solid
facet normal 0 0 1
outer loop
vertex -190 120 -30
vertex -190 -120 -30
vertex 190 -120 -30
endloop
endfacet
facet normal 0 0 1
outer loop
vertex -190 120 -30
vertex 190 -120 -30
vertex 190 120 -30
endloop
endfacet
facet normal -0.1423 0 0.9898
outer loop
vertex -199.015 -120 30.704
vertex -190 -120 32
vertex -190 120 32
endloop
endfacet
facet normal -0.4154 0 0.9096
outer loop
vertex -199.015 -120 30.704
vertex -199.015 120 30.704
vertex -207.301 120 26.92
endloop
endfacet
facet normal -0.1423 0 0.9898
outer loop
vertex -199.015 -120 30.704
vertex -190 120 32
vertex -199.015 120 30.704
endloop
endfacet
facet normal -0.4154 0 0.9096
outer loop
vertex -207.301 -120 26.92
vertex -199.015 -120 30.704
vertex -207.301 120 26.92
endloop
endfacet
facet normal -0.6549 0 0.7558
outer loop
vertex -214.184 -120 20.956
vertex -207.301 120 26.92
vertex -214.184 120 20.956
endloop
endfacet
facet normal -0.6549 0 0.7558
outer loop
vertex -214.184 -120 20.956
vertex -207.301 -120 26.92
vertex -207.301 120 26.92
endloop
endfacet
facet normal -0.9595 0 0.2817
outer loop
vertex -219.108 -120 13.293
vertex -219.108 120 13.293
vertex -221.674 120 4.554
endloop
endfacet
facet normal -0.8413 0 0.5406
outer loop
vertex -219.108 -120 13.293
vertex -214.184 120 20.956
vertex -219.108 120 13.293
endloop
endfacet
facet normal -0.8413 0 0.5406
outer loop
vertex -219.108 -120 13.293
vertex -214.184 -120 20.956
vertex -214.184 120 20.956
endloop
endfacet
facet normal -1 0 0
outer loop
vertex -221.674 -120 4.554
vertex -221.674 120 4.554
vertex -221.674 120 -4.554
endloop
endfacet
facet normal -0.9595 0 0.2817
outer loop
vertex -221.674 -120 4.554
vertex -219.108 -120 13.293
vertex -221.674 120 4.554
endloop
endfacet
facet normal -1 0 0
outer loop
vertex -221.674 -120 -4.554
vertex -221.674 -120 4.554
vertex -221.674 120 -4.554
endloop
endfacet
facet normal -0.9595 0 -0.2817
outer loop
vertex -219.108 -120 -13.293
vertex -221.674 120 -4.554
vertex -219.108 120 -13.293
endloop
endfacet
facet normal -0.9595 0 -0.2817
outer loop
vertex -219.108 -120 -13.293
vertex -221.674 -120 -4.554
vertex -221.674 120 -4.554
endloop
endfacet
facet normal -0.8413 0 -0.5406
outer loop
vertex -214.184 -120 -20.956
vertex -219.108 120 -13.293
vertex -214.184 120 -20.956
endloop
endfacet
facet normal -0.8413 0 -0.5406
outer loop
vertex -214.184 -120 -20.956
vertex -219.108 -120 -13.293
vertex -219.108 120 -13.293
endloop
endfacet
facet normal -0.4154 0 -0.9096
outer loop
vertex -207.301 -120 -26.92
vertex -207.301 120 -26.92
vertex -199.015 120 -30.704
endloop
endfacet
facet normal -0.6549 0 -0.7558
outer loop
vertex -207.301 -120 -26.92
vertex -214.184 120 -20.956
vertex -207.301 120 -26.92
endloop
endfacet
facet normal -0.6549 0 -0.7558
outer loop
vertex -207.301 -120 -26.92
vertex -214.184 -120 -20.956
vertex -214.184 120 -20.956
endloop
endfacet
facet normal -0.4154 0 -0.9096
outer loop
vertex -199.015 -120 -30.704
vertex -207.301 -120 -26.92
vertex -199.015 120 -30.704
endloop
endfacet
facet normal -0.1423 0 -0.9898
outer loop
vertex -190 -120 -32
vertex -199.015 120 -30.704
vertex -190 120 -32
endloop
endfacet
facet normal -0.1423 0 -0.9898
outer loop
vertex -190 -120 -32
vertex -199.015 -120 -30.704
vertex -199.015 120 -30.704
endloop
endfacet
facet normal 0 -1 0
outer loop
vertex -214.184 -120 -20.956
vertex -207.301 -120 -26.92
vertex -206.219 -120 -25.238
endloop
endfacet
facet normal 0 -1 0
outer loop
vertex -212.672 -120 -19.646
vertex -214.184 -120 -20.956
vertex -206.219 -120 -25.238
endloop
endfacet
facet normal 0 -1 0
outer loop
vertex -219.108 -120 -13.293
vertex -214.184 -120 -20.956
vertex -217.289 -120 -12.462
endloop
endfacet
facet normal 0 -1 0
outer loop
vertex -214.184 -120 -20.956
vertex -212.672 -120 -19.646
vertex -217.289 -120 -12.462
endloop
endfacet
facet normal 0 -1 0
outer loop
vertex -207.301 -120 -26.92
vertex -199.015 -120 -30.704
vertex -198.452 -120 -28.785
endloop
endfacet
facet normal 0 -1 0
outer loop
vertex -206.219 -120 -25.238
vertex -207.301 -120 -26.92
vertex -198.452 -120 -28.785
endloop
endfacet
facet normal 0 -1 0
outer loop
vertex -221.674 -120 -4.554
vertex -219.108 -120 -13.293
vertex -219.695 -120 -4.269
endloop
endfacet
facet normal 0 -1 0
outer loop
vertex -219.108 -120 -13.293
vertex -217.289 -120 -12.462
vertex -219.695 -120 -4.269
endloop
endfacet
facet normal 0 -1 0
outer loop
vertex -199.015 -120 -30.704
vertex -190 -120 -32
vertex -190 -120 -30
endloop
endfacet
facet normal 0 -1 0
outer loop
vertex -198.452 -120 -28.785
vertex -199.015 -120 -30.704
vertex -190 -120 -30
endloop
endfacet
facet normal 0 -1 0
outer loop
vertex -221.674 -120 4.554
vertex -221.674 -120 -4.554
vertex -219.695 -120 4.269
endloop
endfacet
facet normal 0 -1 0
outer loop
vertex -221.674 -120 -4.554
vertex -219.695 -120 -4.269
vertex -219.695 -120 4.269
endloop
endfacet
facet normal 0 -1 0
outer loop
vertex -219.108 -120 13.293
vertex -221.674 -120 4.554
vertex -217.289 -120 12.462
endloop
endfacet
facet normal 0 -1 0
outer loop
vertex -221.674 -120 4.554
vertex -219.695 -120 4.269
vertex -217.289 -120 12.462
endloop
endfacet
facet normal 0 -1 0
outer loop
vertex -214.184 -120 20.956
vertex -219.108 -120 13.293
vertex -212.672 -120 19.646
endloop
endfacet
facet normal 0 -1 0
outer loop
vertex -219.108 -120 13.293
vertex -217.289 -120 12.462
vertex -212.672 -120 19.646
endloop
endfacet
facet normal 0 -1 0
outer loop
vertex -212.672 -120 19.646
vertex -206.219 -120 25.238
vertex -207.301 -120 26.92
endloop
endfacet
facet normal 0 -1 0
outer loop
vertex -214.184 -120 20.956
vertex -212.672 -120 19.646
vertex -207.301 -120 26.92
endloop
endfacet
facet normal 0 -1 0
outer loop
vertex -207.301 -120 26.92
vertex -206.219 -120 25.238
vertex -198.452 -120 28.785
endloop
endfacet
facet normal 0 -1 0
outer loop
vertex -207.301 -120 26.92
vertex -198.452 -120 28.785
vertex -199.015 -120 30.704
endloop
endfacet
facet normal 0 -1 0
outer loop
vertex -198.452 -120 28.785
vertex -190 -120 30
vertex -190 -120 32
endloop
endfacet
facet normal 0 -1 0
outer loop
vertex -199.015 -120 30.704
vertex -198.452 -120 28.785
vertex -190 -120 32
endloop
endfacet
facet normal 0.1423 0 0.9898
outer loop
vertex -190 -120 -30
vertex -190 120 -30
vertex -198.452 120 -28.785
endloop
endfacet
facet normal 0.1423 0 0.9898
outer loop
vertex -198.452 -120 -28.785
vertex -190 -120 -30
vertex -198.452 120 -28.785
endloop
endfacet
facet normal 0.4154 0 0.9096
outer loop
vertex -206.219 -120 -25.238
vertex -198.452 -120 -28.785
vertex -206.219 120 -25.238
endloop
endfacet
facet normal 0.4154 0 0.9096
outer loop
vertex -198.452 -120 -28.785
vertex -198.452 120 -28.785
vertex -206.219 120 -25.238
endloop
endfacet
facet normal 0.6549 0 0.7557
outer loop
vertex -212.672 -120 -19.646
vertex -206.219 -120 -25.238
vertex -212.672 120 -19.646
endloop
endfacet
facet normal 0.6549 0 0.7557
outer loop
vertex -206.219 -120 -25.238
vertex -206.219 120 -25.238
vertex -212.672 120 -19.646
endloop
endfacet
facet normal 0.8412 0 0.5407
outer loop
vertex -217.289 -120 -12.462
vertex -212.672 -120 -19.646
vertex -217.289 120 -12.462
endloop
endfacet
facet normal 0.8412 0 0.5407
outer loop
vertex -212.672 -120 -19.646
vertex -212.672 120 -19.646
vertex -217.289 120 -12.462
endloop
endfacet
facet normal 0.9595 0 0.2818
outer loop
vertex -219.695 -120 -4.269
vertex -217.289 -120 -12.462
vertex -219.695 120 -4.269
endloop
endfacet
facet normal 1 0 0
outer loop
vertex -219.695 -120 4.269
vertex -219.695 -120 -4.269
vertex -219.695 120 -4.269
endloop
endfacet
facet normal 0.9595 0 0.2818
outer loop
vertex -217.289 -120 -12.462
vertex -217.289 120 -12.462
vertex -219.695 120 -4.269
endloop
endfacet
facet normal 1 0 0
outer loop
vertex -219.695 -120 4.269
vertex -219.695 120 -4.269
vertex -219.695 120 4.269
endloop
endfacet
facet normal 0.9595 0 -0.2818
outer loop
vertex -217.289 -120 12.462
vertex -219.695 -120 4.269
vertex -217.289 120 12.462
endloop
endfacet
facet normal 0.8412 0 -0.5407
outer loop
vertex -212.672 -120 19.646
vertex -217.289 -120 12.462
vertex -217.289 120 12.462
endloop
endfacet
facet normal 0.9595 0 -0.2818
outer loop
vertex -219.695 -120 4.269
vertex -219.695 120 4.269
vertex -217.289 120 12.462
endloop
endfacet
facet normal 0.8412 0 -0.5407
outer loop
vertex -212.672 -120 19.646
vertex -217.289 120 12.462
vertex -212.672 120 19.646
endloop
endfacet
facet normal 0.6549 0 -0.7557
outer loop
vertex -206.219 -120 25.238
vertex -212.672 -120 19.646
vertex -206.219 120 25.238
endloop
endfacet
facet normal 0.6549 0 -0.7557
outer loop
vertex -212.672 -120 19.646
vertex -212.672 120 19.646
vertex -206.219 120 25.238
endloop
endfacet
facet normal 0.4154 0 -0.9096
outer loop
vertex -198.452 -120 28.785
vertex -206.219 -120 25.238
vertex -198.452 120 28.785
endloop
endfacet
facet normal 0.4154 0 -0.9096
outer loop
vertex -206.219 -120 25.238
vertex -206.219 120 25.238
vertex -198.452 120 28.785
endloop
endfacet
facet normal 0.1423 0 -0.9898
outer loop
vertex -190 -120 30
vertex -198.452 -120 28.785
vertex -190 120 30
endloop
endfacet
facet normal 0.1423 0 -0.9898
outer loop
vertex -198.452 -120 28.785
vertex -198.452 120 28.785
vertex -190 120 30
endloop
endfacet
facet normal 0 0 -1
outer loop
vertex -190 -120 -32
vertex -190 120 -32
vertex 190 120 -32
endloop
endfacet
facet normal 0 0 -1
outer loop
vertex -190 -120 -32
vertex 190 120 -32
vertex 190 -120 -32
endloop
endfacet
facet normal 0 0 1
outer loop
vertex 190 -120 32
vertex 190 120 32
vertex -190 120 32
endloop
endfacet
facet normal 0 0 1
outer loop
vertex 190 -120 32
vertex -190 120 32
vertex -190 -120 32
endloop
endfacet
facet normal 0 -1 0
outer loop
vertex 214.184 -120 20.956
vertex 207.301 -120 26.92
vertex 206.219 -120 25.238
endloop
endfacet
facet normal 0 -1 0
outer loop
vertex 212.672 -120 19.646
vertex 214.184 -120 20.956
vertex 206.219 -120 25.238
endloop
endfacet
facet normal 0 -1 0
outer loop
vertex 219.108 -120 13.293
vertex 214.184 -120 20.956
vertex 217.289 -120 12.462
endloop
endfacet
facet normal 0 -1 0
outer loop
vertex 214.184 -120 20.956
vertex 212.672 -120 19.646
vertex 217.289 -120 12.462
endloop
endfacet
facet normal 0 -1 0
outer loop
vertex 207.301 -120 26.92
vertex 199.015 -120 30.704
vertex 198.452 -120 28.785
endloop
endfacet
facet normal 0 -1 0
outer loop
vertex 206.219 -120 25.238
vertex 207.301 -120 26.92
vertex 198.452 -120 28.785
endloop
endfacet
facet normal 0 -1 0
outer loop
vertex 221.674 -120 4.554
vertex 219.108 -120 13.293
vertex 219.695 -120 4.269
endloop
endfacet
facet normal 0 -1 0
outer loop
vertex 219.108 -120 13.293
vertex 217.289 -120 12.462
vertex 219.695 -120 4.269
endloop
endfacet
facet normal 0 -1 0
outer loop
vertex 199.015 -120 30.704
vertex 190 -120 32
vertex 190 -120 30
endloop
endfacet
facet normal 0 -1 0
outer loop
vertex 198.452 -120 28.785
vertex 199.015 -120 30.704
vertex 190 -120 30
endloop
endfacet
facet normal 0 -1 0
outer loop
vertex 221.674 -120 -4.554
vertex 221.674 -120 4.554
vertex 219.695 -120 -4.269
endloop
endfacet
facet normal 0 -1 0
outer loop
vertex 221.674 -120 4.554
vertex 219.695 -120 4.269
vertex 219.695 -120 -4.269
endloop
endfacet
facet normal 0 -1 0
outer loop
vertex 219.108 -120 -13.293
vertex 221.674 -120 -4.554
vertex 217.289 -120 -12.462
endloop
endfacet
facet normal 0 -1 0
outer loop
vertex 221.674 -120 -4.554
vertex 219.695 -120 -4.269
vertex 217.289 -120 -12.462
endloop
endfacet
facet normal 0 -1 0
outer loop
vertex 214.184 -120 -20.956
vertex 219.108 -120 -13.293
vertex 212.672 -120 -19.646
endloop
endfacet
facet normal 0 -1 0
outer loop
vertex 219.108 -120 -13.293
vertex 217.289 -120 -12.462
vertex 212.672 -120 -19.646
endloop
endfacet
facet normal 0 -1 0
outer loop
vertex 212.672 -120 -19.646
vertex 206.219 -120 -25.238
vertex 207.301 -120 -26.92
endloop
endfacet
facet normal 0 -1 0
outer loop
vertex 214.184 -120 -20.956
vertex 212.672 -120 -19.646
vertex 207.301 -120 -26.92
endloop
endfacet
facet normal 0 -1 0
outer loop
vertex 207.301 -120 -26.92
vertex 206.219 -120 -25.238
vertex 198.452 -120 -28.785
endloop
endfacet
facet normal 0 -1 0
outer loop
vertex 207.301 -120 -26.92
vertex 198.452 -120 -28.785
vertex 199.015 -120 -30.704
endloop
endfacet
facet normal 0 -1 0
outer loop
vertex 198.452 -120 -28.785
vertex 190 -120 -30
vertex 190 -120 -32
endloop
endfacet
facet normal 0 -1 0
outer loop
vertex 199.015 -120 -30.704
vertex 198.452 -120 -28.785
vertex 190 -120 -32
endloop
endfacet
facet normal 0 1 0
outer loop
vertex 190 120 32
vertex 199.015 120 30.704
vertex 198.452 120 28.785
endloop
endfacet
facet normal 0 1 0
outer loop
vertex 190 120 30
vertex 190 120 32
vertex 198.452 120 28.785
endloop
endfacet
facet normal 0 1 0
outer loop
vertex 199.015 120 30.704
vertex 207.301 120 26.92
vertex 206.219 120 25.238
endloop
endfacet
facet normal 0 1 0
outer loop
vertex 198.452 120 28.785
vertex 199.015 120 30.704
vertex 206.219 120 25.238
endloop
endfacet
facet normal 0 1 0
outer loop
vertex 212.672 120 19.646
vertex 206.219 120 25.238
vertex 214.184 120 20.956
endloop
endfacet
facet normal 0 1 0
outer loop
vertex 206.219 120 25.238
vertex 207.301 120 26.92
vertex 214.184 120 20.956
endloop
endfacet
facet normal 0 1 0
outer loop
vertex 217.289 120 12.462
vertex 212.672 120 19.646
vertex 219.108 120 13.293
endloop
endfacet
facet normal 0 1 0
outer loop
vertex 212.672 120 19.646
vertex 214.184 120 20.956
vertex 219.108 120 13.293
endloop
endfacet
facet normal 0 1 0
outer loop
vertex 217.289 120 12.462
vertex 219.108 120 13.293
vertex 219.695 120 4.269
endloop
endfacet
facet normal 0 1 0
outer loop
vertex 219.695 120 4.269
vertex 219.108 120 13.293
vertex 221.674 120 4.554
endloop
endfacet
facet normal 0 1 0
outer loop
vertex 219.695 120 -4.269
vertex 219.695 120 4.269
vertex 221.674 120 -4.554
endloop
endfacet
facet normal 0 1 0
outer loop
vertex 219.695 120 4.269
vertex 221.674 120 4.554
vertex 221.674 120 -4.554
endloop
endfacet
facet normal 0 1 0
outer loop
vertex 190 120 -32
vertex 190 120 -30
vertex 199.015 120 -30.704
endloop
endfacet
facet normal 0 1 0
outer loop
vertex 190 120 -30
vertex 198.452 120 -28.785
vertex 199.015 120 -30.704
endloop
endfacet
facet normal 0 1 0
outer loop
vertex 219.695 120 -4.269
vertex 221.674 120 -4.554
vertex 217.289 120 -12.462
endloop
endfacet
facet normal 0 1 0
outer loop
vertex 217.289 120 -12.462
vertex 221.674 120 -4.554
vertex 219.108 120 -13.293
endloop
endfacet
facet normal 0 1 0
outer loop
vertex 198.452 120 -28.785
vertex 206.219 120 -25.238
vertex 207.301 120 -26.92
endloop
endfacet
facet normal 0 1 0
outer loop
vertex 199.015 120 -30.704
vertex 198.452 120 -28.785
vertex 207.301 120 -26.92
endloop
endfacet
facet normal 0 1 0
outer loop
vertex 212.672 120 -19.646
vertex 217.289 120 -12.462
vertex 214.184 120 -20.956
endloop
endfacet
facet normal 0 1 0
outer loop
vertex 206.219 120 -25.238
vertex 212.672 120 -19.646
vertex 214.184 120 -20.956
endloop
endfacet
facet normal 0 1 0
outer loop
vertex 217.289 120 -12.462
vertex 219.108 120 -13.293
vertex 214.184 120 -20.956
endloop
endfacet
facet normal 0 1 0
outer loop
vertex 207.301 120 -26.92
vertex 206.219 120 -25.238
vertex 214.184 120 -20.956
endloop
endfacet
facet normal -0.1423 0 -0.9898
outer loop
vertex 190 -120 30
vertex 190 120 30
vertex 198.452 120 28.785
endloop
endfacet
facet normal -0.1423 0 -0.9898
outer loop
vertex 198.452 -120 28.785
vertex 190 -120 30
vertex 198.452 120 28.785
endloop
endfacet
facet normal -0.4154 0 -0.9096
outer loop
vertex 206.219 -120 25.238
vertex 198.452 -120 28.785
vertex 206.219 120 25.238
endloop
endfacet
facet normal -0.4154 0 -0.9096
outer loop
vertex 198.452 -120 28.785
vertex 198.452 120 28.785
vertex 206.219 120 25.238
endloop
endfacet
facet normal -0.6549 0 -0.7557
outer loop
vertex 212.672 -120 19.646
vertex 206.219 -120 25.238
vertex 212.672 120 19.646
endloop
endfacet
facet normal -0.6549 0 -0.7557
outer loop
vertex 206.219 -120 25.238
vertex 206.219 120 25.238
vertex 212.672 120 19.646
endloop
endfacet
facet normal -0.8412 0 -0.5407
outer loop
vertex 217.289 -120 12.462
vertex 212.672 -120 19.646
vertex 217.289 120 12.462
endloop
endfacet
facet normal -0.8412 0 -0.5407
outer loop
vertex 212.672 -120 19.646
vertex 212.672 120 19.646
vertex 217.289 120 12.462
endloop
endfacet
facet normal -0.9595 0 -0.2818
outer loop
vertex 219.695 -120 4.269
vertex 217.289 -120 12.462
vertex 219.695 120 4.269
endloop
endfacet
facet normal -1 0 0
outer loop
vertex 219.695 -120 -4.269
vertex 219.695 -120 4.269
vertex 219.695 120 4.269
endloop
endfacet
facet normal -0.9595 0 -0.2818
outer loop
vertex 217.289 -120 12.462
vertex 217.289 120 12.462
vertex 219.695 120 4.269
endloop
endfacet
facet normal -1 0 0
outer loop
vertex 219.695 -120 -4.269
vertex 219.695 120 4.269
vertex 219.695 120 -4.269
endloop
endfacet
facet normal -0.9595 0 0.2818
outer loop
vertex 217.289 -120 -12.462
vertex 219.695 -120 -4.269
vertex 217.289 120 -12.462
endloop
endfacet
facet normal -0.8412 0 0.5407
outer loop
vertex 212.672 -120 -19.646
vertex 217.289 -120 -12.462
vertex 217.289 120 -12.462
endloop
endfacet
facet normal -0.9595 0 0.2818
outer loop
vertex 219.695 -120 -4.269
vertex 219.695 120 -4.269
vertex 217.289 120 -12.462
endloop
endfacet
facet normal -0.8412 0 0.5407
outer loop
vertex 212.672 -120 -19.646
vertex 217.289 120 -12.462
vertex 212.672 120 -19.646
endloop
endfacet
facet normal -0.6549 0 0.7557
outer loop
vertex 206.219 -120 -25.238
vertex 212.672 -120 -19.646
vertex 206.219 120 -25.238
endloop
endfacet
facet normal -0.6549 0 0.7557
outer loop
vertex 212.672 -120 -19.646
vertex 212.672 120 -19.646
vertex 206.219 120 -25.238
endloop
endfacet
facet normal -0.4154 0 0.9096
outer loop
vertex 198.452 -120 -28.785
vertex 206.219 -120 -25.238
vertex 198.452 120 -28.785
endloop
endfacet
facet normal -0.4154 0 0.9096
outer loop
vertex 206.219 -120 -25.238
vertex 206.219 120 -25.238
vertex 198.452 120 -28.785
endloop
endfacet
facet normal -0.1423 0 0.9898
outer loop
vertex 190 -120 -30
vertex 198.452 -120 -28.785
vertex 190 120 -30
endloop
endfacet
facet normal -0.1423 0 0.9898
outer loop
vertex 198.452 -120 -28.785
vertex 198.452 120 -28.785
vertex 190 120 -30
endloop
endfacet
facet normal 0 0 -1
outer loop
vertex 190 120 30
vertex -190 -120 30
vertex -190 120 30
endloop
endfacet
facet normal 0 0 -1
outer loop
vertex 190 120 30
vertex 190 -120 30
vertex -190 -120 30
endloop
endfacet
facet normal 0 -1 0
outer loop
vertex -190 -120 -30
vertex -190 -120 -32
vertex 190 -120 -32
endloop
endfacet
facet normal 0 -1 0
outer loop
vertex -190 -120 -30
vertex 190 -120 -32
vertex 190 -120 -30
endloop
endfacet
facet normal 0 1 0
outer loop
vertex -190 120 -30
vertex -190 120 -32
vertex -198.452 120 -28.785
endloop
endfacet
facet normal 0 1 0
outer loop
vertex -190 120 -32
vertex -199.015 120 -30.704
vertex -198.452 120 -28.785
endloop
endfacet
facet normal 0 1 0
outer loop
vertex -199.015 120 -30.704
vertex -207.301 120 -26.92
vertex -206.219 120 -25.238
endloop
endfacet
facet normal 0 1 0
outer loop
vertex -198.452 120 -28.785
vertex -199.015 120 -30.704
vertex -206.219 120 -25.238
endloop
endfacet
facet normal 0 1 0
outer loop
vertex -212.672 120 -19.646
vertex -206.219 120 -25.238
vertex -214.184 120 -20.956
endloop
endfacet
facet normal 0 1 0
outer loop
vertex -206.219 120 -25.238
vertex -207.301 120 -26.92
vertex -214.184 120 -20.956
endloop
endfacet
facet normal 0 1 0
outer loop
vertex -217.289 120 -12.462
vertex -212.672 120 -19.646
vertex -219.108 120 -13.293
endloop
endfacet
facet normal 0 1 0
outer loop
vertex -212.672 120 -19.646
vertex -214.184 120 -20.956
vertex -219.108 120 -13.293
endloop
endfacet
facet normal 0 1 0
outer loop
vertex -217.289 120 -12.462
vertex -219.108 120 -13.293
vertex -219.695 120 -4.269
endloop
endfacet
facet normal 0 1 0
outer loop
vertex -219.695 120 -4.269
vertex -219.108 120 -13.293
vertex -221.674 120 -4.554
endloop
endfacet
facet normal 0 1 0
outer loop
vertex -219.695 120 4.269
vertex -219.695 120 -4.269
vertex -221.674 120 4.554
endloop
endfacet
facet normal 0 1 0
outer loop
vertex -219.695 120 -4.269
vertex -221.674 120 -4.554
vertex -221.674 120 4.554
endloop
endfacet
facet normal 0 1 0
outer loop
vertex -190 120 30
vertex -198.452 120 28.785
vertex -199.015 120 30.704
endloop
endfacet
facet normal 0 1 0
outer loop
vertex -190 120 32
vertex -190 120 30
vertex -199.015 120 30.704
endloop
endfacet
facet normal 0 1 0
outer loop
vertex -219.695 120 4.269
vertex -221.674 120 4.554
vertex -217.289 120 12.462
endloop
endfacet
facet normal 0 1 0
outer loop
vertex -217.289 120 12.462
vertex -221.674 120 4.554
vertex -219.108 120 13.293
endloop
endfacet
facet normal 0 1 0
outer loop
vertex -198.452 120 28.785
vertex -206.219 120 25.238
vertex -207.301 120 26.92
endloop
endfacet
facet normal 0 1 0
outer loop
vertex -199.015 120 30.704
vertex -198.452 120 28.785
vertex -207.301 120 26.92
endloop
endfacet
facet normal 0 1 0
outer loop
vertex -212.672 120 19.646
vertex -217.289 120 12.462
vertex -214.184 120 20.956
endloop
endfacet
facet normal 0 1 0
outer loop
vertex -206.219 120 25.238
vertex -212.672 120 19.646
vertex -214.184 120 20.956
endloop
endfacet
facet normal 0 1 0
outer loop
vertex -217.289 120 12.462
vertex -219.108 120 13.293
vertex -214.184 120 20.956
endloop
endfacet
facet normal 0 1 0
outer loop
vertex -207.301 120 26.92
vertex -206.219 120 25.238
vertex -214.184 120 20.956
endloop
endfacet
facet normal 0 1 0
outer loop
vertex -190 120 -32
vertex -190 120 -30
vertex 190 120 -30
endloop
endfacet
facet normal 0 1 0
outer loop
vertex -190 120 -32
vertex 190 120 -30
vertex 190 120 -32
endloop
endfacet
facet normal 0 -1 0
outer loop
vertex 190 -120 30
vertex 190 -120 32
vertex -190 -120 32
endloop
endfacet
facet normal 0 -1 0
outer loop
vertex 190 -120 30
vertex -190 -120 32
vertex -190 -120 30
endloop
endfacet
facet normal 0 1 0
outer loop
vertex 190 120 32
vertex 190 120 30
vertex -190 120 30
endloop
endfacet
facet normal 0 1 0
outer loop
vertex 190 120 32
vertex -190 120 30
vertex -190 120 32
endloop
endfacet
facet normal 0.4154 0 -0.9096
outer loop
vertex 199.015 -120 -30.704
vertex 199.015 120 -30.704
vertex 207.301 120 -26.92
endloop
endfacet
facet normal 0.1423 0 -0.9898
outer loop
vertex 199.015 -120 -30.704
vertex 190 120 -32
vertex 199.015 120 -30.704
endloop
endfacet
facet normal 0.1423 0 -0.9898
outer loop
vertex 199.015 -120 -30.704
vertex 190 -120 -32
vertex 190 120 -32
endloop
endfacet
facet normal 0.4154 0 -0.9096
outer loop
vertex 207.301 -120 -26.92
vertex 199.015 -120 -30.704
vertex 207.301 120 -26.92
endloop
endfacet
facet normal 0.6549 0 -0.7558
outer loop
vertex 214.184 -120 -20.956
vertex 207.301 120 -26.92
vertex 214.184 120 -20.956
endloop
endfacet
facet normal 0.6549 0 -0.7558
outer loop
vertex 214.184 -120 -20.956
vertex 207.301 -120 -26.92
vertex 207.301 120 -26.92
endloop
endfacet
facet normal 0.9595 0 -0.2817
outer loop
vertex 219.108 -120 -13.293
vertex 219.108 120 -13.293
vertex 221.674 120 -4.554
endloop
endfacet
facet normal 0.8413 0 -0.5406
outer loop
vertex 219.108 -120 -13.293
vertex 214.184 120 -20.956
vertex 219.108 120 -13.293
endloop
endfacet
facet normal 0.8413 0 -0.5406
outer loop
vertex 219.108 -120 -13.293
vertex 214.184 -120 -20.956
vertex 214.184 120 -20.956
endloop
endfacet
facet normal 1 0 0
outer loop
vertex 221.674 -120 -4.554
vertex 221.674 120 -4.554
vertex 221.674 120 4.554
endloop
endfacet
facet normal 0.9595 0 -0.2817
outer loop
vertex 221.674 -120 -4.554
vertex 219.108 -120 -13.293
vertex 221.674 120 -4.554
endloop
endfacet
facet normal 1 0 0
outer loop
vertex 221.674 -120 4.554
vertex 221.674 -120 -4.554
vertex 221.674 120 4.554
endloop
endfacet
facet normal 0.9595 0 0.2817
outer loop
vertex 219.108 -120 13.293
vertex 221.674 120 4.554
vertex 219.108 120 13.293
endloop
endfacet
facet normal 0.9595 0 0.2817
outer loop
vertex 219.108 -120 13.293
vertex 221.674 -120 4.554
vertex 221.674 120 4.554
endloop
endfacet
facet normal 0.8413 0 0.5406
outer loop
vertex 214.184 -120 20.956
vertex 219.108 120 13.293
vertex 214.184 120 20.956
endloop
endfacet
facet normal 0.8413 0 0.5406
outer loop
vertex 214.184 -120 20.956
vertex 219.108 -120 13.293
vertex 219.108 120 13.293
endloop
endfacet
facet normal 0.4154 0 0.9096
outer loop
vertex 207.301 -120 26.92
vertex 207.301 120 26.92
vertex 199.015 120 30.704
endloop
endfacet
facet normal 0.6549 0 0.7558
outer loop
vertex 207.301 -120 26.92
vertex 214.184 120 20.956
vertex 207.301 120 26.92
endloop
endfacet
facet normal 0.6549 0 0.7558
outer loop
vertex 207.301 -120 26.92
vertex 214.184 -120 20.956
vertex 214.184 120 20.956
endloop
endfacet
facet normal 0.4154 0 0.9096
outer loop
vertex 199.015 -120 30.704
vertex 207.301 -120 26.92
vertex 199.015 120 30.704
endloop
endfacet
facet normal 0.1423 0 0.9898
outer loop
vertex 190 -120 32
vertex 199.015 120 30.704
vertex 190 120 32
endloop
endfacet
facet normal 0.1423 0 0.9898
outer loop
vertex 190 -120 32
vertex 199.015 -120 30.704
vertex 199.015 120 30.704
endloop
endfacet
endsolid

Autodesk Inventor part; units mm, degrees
ref_plane "YZ Plane" through (0, 0, 0) normal (1, 0, 0) x (0, 1, 0)
ref_plane "XZ Plane" through (0, 0, 0) normal (0, 1, 0) x (-1, 0, 0)
sketch "Sketch1" plane through (0, 0, 0) normal (0, 1, 0) x (-1, 0, 0)
  line L0 (-220, 0) -> (220, 0) construction
  line L1 (-190, -30) -> (190, -30)
  line L2 (190, 30) -> (-190, 30)
  arc A0 (-190, 30) -> (-190, -30) centre (-190, 0) ccw
  arc A1 (190, -30) -> (190, 30) centre (190, 0) ccw
  point P0 (0, 0)
  point P1 (0, 0)
  dimension "d0" = 380
  dimension "d1" = 60
ref_plane "Work Plane1" through (220, 0, 0) normal (0, 0, -1) x (-1, 0, 0)
sketch "Sketch2" plane through (220, 0, 0) normal (0, 0, -1) x (-1, 0, 0)
  line L0 (0, 120) -> (-2, 120)
  line L1 (-2, 120) -> (-2, -120)
  line L2 (-2, -120) -> (0, -120)
  line L3 (0, -120) -> (0, 120)
  line L4 (0, 120) -> (-2, -120) construction
  line L5 (-2, 120) -> (0, -120) construction
  point P0 (220, 0)
  point P1 (-1, 0)
  point P2 (-1, -120)
  point P3 (-1, 120)
  point P4 (0, 0)
  point P5 (-2, 0)
  point P6 (0, 0)
  dimension "d2" = 240
  dimension "d3" = 2
sweep "Sweep1" add profiles "Sketch2" path "Sketch1"
properties part number "HCMUTE-CDT23-BELT_PHAN_LOAI" material "PVC, Unplasticized"
